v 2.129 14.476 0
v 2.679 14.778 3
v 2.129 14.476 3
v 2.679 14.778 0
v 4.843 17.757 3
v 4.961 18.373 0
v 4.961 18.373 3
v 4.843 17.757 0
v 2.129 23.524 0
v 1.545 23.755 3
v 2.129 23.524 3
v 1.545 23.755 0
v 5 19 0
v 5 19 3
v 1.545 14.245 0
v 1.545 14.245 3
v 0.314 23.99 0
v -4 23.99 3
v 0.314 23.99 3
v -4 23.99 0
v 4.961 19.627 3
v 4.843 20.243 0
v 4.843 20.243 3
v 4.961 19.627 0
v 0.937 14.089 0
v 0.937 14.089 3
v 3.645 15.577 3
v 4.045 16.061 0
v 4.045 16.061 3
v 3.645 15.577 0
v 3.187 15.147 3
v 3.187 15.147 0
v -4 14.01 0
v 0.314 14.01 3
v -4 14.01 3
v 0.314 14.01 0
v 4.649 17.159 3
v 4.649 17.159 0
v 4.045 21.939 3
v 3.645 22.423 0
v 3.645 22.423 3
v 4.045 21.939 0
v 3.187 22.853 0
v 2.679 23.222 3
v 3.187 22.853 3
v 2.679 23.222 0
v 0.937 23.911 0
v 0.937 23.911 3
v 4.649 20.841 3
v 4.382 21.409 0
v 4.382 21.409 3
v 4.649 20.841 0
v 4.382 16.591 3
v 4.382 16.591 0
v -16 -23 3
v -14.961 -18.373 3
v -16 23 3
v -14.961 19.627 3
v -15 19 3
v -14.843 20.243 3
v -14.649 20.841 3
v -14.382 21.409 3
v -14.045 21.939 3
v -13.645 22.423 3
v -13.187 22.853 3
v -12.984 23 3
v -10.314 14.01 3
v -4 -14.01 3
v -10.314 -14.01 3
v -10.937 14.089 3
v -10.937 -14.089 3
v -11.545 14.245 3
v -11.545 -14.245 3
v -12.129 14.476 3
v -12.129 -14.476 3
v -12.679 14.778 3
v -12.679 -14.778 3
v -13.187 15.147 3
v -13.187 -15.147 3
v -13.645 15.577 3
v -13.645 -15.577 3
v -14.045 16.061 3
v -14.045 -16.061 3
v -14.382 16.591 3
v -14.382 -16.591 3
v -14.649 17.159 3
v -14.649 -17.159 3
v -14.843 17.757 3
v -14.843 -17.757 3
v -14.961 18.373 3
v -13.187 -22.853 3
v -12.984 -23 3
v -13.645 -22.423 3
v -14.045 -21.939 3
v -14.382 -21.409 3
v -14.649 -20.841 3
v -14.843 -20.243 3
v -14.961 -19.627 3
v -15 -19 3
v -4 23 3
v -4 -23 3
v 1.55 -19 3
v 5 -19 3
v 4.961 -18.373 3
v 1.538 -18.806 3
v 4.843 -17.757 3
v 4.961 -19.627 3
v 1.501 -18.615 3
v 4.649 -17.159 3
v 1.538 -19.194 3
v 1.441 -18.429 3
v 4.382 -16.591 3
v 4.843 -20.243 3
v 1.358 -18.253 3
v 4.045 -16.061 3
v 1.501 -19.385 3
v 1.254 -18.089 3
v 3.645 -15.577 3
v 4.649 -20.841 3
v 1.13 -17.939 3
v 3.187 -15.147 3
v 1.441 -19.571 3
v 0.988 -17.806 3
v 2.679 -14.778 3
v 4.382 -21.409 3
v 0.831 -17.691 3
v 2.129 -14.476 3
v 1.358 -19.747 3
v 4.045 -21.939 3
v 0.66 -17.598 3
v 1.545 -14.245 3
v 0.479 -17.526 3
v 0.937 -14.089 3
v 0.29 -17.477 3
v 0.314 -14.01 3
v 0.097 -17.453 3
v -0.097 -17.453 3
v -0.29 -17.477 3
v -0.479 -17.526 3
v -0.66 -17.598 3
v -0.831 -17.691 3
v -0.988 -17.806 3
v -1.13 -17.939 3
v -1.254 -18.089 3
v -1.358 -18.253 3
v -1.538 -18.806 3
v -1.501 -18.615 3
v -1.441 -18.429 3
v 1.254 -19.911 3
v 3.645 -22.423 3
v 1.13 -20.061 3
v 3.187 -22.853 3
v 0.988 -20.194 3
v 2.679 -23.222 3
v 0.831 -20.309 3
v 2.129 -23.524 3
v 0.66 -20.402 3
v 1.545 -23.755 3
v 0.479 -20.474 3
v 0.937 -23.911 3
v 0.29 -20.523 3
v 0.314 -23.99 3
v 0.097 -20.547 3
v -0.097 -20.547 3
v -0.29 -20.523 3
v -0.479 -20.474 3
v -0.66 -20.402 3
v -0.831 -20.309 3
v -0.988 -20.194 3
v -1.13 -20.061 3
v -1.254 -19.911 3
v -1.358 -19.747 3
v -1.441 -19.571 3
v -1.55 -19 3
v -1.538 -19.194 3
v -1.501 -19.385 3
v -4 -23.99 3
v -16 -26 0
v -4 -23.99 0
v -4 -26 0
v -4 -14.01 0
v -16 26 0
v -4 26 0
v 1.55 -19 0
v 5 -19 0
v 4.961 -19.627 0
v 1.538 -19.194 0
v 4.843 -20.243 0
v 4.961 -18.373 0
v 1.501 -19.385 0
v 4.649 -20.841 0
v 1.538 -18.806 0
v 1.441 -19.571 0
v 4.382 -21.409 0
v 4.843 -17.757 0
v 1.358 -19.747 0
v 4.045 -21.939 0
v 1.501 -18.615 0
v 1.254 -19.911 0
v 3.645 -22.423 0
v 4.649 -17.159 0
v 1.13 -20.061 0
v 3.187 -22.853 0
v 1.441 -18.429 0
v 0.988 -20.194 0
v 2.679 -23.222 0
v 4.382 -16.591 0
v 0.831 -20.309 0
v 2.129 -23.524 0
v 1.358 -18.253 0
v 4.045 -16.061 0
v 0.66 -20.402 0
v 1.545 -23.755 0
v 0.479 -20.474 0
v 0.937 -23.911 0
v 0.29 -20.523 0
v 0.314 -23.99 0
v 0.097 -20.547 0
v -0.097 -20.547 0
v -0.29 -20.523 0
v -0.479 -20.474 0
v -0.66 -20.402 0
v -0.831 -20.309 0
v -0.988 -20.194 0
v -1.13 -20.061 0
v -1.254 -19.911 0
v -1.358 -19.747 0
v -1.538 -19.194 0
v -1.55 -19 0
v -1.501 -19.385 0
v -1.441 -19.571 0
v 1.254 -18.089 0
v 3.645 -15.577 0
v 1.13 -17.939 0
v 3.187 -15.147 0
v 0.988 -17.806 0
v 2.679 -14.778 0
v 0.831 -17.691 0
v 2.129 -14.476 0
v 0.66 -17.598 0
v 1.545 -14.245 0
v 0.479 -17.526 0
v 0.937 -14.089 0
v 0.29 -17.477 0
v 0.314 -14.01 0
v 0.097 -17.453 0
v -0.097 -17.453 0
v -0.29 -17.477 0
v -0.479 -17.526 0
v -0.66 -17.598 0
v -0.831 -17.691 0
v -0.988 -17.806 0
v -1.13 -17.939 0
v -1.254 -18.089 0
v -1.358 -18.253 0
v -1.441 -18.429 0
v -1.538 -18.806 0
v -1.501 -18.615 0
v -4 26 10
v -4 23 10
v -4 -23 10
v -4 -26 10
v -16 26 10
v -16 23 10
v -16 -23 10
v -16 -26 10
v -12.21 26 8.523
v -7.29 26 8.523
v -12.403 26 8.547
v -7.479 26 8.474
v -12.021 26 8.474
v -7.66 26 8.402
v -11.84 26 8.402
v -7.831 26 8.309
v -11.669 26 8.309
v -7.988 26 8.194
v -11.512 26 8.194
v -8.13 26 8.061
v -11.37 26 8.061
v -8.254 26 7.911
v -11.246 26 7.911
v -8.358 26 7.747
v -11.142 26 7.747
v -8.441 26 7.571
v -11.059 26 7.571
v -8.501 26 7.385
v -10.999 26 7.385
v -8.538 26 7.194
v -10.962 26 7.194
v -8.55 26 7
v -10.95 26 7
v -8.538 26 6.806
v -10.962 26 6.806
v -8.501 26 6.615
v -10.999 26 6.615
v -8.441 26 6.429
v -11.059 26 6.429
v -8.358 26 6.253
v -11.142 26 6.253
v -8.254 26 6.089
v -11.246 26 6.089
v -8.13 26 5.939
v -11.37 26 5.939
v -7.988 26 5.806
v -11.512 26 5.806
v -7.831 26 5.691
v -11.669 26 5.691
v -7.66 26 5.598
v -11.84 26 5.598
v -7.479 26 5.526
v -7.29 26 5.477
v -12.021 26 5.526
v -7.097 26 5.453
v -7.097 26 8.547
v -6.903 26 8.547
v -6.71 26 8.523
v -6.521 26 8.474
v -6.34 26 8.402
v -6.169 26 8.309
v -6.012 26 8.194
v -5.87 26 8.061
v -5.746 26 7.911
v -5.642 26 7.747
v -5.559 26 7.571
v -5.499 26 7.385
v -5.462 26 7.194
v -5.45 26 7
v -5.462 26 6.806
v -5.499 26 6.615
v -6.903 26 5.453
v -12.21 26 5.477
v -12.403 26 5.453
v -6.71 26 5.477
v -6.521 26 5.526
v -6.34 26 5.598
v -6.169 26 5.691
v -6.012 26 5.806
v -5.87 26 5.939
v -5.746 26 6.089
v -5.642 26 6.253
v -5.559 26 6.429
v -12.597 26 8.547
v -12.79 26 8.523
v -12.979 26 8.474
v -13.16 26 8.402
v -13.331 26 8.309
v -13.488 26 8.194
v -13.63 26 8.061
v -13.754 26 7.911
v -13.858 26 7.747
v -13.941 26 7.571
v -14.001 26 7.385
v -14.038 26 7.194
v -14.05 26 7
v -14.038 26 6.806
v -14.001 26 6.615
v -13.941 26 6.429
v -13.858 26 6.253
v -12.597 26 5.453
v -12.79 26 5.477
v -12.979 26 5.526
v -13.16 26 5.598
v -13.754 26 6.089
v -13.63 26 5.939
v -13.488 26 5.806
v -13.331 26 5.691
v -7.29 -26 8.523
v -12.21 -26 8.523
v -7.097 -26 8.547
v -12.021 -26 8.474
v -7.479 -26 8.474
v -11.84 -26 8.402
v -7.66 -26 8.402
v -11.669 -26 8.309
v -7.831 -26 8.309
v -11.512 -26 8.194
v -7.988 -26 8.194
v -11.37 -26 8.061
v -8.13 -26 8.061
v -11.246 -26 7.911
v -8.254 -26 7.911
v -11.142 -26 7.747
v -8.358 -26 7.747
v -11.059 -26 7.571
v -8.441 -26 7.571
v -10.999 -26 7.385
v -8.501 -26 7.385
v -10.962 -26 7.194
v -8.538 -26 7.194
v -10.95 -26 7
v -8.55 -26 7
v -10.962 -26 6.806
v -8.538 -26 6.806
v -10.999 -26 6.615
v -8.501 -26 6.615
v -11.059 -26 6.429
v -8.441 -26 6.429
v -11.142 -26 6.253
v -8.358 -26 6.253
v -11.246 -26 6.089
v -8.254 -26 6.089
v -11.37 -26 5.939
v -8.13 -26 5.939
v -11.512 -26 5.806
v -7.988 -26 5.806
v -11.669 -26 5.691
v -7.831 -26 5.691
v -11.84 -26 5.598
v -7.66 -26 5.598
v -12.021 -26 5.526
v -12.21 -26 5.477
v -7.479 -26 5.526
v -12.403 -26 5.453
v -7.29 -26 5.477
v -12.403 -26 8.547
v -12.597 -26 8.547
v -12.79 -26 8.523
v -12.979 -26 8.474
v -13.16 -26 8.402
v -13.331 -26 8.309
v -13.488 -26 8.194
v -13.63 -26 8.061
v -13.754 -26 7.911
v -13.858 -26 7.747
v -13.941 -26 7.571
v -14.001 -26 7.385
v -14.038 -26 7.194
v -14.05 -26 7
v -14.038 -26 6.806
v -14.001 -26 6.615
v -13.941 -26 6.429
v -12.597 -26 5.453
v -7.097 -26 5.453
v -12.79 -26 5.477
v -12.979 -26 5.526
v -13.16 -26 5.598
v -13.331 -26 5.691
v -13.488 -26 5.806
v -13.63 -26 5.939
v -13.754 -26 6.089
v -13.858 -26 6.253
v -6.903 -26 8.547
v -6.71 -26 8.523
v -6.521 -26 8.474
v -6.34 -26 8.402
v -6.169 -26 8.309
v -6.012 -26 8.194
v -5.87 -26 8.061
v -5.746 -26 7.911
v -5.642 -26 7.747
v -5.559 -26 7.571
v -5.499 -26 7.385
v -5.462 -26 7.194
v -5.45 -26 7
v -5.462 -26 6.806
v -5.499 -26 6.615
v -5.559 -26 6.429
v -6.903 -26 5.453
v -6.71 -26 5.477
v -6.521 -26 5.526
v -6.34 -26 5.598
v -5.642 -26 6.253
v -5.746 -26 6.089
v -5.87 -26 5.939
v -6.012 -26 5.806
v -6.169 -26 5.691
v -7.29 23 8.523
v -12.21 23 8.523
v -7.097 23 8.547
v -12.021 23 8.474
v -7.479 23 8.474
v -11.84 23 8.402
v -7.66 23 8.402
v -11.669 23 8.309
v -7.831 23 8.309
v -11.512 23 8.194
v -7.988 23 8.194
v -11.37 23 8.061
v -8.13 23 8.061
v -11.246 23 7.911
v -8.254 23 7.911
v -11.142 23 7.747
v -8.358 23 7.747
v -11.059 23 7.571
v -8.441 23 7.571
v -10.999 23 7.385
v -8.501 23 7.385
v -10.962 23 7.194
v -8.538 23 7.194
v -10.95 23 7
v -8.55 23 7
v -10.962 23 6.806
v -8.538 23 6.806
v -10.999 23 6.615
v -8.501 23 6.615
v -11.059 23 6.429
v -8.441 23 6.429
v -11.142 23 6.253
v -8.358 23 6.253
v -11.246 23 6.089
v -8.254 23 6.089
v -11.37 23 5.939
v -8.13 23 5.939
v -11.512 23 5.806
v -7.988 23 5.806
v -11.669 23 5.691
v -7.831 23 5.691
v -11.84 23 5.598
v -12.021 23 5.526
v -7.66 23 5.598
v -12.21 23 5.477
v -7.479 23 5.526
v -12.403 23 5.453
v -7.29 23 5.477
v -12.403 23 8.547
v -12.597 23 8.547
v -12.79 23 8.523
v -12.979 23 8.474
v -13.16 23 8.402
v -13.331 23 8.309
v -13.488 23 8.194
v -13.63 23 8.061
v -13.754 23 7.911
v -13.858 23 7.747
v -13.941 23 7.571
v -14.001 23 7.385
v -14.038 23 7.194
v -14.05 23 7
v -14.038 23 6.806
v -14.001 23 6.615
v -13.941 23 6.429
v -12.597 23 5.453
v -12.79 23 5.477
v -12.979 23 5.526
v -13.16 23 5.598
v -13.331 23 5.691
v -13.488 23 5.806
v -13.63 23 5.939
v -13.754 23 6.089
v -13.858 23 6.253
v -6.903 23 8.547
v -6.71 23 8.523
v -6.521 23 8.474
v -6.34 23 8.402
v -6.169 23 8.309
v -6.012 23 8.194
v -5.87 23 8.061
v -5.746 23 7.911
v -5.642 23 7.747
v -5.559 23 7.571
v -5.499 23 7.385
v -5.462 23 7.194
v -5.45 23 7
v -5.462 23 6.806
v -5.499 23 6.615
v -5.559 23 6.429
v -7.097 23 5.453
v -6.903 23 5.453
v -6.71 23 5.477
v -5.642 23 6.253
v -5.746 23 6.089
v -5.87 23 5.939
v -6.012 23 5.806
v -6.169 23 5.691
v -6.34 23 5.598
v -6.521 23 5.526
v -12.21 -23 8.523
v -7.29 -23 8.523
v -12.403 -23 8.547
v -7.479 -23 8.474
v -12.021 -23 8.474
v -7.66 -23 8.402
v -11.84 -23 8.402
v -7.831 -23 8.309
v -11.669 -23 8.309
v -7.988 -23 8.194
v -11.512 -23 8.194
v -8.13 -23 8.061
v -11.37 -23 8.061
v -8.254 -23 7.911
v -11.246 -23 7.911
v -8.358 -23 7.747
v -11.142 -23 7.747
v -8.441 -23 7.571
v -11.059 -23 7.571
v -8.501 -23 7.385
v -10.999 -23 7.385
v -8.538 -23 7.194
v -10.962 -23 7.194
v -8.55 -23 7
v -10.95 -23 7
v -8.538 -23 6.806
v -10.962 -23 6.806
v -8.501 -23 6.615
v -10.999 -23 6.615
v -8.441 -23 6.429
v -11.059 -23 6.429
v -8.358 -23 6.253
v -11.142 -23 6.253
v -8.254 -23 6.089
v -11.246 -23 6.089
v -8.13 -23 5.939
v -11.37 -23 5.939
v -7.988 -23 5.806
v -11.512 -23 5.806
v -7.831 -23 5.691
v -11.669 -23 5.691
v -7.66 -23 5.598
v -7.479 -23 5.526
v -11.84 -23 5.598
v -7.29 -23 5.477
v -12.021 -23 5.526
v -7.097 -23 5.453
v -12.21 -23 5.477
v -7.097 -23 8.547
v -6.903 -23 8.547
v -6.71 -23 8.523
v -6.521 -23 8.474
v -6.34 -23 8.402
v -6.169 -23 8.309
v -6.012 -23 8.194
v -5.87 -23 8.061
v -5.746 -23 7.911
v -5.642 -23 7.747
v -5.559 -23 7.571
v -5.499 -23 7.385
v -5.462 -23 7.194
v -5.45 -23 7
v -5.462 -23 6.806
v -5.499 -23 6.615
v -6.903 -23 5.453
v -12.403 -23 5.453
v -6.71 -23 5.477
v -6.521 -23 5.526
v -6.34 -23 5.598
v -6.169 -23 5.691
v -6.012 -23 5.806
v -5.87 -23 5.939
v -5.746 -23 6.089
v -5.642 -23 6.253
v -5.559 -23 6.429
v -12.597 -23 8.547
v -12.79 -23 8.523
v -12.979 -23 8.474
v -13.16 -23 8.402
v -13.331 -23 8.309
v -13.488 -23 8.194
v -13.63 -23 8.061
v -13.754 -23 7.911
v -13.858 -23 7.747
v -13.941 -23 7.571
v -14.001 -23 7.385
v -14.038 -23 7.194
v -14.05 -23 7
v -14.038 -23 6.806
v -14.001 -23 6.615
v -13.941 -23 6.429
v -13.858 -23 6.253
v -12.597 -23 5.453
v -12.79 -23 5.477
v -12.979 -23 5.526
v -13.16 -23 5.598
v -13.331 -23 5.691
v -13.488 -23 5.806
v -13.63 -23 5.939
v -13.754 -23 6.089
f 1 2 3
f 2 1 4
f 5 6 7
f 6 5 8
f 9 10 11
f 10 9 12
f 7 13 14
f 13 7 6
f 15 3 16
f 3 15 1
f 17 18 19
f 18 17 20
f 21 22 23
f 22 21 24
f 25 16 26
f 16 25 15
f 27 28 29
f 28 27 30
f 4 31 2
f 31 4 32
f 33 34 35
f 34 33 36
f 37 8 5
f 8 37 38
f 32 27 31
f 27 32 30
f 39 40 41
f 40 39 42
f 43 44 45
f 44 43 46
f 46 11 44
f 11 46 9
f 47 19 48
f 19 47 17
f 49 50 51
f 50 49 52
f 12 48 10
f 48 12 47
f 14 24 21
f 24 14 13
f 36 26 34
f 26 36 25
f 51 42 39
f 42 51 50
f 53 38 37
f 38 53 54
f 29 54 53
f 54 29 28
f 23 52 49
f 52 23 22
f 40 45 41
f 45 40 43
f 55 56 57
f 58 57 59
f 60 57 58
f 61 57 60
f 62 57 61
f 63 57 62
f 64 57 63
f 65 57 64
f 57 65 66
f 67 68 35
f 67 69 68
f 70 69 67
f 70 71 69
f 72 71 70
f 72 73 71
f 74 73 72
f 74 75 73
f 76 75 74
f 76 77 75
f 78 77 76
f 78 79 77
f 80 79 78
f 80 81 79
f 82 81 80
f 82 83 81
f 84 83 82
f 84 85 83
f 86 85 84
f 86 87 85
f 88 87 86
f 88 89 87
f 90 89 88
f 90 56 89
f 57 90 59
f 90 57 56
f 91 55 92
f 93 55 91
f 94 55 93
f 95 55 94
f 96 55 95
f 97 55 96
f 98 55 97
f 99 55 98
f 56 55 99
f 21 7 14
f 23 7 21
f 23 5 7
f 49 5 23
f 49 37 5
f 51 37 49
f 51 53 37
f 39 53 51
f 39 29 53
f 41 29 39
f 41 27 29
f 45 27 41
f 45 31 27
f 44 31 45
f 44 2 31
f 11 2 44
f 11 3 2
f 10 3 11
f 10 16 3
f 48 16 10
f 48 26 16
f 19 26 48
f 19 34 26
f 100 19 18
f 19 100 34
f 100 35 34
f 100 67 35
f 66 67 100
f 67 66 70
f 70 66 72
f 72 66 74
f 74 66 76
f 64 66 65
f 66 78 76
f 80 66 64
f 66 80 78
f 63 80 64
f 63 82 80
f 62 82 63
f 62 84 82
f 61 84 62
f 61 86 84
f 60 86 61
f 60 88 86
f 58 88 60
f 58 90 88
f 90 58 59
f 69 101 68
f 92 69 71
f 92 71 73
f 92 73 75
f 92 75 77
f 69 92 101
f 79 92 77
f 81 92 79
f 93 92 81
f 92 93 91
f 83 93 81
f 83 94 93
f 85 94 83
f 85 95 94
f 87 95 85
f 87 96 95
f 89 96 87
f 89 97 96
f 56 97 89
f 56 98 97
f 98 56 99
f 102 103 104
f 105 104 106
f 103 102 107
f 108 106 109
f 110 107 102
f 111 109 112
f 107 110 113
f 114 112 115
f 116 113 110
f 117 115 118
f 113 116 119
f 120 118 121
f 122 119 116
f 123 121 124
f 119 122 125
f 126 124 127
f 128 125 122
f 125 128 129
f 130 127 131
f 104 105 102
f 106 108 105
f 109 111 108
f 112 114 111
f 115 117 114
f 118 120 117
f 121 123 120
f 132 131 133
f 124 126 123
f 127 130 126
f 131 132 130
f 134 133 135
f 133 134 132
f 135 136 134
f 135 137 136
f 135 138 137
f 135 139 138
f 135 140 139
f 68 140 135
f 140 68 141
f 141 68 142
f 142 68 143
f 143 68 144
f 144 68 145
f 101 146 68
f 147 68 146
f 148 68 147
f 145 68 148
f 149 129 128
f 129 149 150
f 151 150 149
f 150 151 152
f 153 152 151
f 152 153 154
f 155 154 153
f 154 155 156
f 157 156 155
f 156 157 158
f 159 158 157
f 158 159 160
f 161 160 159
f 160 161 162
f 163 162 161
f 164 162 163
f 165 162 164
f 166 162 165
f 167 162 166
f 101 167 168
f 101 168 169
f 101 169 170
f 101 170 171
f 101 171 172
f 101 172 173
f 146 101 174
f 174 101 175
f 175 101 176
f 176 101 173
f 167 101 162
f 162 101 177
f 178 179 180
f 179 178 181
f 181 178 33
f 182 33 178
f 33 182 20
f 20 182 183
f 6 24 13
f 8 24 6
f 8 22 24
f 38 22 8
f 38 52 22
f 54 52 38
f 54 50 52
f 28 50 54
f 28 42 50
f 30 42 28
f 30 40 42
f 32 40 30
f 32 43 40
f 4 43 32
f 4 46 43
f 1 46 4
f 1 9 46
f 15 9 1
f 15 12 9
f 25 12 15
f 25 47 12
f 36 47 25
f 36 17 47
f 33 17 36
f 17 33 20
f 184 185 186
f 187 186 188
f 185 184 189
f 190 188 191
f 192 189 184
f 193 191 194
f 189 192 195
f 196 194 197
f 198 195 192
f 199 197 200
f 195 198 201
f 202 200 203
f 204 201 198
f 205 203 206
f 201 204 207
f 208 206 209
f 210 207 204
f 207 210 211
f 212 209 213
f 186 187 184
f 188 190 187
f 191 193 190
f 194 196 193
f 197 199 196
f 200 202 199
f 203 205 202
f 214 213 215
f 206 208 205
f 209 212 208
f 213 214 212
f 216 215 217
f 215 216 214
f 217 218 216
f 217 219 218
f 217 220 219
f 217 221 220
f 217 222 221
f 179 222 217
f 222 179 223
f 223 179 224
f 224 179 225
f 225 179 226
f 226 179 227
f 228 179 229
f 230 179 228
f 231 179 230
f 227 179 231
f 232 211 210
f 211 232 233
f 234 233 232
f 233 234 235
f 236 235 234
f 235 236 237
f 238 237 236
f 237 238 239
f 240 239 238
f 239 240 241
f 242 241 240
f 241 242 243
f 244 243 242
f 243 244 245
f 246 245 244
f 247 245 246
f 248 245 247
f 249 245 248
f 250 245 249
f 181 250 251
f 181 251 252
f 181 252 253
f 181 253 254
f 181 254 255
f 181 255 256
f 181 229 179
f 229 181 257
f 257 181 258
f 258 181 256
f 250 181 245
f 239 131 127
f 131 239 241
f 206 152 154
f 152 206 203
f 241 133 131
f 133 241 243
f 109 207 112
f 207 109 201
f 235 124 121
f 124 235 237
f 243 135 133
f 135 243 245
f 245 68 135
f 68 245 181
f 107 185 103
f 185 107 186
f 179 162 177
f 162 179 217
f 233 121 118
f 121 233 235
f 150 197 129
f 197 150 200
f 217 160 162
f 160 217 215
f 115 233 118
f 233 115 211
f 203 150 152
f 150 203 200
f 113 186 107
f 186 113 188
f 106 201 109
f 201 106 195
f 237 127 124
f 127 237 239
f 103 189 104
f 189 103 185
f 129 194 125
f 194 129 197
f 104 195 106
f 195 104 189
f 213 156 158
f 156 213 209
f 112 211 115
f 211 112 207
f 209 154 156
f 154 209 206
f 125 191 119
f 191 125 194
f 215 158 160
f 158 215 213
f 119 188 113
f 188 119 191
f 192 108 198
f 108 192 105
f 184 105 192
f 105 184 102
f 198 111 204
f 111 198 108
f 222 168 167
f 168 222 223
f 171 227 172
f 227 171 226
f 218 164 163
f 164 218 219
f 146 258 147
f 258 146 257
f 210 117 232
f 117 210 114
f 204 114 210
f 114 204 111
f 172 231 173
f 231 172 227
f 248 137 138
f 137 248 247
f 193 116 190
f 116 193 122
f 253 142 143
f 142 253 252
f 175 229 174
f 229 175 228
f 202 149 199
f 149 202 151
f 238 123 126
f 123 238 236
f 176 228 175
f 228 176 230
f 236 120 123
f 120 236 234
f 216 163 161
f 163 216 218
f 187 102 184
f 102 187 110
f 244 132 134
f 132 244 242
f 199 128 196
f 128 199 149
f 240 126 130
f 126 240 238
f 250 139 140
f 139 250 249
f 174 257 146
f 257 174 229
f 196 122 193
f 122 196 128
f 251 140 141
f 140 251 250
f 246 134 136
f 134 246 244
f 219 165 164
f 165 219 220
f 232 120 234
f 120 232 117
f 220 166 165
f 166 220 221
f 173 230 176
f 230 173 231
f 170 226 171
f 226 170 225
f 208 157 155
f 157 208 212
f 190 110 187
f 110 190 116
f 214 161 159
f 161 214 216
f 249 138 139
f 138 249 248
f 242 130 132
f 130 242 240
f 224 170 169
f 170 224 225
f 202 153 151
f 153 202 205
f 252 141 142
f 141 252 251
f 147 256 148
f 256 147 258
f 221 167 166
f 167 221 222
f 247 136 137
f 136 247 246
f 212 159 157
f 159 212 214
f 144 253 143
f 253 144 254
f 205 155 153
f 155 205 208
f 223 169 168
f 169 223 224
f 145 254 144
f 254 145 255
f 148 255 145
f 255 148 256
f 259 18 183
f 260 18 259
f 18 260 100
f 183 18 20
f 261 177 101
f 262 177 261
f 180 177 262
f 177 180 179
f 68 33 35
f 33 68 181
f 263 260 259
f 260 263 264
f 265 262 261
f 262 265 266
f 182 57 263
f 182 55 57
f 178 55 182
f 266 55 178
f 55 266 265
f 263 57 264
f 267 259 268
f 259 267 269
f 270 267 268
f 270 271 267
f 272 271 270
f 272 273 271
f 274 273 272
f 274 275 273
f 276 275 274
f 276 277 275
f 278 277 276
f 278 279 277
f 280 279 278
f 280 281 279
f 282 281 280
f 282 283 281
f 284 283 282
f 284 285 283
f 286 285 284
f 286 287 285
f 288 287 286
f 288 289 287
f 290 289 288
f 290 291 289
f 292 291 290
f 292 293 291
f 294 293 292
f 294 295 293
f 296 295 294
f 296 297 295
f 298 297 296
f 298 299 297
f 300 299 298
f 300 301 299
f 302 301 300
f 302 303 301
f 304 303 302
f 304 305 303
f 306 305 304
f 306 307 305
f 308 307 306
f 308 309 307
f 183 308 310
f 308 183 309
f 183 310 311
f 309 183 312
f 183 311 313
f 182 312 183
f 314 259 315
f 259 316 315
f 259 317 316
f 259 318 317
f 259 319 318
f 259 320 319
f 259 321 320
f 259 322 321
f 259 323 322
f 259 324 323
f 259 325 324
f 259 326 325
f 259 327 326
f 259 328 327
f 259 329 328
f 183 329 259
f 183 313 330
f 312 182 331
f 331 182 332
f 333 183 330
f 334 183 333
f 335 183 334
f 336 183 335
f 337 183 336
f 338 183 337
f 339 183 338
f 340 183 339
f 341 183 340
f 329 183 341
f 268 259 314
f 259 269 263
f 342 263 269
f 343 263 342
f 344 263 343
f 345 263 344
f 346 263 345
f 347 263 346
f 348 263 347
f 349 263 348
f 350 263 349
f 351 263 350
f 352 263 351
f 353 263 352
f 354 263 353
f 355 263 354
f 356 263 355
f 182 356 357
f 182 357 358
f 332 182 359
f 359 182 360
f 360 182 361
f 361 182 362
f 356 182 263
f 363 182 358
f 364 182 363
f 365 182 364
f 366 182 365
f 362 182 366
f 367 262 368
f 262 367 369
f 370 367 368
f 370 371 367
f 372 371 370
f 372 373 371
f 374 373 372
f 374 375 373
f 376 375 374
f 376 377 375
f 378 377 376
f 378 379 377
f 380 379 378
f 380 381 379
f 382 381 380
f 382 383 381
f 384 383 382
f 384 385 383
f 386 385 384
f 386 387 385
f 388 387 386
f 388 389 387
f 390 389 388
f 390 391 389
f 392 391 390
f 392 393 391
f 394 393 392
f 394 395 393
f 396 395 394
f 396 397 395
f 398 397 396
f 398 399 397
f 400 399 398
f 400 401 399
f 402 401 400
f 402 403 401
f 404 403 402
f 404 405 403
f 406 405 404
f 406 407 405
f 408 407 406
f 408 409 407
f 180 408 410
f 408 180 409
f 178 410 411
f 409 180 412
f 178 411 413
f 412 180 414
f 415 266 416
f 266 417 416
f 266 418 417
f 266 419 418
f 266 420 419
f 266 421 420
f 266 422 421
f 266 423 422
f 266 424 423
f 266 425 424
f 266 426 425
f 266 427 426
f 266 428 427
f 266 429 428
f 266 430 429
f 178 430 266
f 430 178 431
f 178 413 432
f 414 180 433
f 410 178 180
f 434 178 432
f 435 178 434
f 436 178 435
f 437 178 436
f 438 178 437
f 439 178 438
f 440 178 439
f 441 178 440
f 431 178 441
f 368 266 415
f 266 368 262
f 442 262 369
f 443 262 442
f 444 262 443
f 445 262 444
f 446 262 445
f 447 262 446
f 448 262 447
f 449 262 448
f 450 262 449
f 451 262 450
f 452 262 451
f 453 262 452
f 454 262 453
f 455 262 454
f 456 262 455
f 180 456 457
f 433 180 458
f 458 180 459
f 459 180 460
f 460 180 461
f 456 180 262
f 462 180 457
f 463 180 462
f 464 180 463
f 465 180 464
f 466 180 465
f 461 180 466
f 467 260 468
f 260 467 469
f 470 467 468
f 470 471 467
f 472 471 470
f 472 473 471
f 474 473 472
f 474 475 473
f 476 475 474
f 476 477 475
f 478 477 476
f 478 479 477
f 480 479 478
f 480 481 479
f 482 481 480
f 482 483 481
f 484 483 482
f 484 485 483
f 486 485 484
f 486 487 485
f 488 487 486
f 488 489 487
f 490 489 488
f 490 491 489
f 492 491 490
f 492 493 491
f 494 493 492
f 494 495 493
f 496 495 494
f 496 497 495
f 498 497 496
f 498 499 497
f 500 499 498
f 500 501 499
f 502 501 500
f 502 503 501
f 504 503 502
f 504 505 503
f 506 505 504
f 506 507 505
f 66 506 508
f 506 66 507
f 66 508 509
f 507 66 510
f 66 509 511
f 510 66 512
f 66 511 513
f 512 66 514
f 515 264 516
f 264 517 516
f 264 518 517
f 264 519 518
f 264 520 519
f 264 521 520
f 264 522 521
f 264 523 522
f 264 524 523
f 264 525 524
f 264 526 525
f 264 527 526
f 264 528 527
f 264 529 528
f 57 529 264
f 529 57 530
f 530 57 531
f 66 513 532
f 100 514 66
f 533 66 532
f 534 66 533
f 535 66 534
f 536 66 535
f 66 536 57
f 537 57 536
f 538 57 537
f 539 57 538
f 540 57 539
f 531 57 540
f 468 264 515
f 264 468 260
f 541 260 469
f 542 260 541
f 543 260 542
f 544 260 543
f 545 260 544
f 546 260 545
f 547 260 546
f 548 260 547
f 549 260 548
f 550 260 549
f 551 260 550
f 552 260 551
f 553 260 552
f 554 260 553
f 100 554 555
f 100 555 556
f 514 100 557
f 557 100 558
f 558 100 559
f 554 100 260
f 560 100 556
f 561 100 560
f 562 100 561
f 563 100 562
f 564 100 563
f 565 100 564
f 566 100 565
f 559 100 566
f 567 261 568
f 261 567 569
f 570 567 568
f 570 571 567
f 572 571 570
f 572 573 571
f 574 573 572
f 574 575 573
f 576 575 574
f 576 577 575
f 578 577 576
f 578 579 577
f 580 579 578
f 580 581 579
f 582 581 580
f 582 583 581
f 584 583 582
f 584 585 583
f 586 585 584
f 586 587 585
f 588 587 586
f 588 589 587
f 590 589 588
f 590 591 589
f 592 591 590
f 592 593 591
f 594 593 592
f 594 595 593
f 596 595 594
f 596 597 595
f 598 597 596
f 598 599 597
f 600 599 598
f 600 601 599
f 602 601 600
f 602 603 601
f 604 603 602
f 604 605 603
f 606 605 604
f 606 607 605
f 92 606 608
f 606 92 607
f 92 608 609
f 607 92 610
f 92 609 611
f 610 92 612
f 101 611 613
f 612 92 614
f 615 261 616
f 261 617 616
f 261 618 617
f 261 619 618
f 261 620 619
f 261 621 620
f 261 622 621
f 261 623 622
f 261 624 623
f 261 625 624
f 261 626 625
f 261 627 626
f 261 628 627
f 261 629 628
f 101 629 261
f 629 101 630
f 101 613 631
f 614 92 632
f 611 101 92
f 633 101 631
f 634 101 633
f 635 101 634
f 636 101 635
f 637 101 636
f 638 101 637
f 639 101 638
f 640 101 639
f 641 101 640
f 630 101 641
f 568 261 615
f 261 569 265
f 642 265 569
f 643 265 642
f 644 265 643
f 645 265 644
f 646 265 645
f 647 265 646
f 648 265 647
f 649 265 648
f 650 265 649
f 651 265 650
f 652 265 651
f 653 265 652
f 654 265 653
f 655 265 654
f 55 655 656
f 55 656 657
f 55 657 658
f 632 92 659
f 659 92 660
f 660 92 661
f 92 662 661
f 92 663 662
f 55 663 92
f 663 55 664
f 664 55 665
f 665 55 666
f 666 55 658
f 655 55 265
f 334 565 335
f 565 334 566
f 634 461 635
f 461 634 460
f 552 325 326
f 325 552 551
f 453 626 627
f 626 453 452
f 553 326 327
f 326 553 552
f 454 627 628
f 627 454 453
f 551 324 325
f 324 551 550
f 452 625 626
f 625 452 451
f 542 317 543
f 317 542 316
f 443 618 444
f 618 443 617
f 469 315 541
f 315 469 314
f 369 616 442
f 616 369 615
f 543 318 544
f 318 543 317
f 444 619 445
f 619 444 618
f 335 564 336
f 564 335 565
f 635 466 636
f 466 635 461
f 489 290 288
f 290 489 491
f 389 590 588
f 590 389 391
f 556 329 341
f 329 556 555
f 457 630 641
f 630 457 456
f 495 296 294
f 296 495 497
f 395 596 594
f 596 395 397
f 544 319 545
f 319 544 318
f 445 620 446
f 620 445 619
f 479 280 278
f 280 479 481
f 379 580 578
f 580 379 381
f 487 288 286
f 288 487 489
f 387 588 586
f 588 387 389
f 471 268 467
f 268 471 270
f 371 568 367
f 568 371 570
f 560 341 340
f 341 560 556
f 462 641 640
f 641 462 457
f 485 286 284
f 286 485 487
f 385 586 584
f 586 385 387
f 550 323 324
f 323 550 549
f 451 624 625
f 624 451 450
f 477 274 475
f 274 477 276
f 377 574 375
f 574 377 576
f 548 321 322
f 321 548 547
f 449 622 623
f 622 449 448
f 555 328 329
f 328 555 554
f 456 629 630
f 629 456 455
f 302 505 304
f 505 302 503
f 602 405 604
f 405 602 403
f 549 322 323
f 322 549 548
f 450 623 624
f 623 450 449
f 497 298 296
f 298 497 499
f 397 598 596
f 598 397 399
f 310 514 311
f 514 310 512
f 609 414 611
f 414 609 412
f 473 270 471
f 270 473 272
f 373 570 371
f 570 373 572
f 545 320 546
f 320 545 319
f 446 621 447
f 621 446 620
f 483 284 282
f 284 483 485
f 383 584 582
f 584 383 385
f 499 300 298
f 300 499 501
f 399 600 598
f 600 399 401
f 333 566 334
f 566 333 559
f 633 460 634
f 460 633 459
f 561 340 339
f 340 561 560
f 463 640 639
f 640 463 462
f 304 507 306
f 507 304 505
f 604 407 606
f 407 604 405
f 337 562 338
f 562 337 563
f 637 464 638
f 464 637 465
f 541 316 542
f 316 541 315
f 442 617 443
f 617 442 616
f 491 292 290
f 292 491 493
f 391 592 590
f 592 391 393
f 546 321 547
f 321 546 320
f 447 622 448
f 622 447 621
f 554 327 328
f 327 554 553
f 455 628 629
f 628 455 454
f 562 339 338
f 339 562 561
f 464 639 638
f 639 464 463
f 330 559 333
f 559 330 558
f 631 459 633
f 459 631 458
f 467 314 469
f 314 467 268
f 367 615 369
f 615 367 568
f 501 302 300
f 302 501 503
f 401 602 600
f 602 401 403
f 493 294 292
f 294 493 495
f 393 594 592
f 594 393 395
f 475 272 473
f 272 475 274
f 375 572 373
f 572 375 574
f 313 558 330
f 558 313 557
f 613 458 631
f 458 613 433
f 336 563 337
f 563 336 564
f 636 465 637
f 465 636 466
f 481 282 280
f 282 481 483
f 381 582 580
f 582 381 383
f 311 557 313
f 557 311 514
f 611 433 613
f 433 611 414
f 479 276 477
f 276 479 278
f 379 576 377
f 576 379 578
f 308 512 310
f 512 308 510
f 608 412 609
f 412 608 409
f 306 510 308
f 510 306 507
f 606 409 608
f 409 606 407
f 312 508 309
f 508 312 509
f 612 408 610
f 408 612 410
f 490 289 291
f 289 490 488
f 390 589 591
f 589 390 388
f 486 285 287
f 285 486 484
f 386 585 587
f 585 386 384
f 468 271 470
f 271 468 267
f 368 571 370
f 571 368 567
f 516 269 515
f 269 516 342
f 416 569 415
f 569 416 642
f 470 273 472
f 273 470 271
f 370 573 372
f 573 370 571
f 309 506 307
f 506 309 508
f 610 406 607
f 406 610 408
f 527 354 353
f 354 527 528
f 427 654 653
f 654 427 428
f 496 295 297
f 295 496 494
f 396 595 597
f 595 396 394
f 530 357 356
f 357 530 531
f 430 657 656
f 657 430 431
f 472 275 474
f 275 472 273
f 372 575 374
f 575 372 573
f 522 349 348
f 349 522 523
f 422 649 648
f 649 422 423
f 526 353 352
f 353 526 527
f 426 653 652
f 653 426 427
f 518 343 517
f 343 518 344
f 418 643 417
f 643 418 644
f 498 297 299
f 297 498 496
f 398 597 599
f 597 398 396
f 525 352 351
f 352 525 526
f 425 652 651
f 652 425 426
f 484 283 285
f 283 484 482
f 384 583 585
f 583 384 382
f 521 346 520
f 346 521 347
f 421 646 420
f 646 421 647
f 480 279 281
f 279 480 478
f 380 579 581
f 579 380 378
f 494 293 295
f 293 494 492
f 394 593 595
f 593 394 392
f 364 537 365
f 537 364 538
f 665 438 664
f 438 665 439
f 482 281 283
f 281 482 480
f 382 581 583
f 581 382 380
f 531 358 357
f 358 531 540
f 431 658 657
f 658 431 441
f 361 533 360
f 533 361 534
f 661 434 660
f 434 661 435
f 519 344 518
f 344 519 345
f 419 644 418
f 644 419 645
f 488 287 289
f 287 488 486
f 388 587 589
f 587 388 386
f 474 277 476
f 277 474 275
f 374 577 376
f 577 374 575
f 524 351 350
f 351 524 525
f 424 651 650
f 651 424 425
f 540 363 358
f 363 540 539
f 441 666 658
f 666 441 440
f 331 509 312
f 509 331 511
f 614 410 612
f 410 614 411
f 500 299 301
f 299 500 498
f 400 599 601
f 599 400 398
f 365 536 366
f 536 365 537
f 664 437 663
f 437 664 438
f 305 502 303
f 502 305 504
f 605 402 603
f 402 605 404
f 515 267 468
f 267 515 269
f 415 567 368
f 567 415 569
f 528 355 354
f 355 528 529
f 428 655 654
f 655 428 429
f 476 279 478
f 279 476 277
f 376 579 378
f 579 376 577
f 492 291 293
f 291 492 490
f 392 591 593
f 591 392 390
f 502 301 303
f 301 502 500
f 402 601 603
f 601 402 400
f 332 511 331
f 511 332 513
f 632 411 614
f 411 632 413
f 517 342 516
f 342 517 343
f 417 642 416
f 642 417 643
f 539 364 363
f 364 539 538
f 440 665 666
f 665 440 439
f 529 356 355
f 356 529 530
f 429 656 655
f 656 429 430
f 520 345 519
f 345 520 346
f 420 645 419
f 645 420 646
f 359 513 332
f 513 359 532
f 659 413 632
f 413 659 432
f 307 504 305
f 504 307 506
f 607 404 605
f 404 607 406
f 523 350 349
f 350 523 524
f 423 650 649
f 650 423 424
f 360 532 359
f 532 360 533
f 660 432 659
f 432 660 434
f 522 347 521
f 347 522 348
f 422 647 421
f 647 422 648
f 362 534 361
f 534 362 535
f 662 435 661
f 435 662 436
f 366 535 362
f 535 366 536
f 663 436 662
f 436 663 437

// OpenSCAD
$fn = 50;


/*
difference(){
	cylinder(h = 15, r=19.5);	

	translate([0,0,-1])
	cylinder(h = 17, r=17.5);
}
*/


translate([0,19,0])
cylinder(h = 3, r=1.55);
translate([-10,19,0])
cylinder(h = 3, r=1.55);

translate([0,0,0])
union() {
	difference() {
		union() {
			hull() {
				translate([0,19,0])
				cylinder(h = 3, r=5);
				translate([-10,19,0])
				cylinder(h = 3, r=5);
			}
				

			hull() {
				translate([0,-19,0])
				cylinder(h = 3, r=5);
				translate([-10,-19,0])
				cylinder(h = 3, r=5);	
			}
		}
		translate([0,19,-1])
		cylinder(h = 6, r=1.55);
		translate([0,-19,-1])
		cylinder(h = 6, r=1.55);
	}



	difference() {
		translate([-10,0,5]) cube(size=[12,52,10],center=true);	

		translate([-10,0,7]) cube(size=[20,46,8],center=true);

		translate([-7,30,7])
		rotate(a=[90,0,0])
		cylinder(h = 60, r=1.55);

		translate([-12.5,30,7])
		rotate(a=[90,0,0])
		cylinder(h = 60, r=1.55);

	}
}
